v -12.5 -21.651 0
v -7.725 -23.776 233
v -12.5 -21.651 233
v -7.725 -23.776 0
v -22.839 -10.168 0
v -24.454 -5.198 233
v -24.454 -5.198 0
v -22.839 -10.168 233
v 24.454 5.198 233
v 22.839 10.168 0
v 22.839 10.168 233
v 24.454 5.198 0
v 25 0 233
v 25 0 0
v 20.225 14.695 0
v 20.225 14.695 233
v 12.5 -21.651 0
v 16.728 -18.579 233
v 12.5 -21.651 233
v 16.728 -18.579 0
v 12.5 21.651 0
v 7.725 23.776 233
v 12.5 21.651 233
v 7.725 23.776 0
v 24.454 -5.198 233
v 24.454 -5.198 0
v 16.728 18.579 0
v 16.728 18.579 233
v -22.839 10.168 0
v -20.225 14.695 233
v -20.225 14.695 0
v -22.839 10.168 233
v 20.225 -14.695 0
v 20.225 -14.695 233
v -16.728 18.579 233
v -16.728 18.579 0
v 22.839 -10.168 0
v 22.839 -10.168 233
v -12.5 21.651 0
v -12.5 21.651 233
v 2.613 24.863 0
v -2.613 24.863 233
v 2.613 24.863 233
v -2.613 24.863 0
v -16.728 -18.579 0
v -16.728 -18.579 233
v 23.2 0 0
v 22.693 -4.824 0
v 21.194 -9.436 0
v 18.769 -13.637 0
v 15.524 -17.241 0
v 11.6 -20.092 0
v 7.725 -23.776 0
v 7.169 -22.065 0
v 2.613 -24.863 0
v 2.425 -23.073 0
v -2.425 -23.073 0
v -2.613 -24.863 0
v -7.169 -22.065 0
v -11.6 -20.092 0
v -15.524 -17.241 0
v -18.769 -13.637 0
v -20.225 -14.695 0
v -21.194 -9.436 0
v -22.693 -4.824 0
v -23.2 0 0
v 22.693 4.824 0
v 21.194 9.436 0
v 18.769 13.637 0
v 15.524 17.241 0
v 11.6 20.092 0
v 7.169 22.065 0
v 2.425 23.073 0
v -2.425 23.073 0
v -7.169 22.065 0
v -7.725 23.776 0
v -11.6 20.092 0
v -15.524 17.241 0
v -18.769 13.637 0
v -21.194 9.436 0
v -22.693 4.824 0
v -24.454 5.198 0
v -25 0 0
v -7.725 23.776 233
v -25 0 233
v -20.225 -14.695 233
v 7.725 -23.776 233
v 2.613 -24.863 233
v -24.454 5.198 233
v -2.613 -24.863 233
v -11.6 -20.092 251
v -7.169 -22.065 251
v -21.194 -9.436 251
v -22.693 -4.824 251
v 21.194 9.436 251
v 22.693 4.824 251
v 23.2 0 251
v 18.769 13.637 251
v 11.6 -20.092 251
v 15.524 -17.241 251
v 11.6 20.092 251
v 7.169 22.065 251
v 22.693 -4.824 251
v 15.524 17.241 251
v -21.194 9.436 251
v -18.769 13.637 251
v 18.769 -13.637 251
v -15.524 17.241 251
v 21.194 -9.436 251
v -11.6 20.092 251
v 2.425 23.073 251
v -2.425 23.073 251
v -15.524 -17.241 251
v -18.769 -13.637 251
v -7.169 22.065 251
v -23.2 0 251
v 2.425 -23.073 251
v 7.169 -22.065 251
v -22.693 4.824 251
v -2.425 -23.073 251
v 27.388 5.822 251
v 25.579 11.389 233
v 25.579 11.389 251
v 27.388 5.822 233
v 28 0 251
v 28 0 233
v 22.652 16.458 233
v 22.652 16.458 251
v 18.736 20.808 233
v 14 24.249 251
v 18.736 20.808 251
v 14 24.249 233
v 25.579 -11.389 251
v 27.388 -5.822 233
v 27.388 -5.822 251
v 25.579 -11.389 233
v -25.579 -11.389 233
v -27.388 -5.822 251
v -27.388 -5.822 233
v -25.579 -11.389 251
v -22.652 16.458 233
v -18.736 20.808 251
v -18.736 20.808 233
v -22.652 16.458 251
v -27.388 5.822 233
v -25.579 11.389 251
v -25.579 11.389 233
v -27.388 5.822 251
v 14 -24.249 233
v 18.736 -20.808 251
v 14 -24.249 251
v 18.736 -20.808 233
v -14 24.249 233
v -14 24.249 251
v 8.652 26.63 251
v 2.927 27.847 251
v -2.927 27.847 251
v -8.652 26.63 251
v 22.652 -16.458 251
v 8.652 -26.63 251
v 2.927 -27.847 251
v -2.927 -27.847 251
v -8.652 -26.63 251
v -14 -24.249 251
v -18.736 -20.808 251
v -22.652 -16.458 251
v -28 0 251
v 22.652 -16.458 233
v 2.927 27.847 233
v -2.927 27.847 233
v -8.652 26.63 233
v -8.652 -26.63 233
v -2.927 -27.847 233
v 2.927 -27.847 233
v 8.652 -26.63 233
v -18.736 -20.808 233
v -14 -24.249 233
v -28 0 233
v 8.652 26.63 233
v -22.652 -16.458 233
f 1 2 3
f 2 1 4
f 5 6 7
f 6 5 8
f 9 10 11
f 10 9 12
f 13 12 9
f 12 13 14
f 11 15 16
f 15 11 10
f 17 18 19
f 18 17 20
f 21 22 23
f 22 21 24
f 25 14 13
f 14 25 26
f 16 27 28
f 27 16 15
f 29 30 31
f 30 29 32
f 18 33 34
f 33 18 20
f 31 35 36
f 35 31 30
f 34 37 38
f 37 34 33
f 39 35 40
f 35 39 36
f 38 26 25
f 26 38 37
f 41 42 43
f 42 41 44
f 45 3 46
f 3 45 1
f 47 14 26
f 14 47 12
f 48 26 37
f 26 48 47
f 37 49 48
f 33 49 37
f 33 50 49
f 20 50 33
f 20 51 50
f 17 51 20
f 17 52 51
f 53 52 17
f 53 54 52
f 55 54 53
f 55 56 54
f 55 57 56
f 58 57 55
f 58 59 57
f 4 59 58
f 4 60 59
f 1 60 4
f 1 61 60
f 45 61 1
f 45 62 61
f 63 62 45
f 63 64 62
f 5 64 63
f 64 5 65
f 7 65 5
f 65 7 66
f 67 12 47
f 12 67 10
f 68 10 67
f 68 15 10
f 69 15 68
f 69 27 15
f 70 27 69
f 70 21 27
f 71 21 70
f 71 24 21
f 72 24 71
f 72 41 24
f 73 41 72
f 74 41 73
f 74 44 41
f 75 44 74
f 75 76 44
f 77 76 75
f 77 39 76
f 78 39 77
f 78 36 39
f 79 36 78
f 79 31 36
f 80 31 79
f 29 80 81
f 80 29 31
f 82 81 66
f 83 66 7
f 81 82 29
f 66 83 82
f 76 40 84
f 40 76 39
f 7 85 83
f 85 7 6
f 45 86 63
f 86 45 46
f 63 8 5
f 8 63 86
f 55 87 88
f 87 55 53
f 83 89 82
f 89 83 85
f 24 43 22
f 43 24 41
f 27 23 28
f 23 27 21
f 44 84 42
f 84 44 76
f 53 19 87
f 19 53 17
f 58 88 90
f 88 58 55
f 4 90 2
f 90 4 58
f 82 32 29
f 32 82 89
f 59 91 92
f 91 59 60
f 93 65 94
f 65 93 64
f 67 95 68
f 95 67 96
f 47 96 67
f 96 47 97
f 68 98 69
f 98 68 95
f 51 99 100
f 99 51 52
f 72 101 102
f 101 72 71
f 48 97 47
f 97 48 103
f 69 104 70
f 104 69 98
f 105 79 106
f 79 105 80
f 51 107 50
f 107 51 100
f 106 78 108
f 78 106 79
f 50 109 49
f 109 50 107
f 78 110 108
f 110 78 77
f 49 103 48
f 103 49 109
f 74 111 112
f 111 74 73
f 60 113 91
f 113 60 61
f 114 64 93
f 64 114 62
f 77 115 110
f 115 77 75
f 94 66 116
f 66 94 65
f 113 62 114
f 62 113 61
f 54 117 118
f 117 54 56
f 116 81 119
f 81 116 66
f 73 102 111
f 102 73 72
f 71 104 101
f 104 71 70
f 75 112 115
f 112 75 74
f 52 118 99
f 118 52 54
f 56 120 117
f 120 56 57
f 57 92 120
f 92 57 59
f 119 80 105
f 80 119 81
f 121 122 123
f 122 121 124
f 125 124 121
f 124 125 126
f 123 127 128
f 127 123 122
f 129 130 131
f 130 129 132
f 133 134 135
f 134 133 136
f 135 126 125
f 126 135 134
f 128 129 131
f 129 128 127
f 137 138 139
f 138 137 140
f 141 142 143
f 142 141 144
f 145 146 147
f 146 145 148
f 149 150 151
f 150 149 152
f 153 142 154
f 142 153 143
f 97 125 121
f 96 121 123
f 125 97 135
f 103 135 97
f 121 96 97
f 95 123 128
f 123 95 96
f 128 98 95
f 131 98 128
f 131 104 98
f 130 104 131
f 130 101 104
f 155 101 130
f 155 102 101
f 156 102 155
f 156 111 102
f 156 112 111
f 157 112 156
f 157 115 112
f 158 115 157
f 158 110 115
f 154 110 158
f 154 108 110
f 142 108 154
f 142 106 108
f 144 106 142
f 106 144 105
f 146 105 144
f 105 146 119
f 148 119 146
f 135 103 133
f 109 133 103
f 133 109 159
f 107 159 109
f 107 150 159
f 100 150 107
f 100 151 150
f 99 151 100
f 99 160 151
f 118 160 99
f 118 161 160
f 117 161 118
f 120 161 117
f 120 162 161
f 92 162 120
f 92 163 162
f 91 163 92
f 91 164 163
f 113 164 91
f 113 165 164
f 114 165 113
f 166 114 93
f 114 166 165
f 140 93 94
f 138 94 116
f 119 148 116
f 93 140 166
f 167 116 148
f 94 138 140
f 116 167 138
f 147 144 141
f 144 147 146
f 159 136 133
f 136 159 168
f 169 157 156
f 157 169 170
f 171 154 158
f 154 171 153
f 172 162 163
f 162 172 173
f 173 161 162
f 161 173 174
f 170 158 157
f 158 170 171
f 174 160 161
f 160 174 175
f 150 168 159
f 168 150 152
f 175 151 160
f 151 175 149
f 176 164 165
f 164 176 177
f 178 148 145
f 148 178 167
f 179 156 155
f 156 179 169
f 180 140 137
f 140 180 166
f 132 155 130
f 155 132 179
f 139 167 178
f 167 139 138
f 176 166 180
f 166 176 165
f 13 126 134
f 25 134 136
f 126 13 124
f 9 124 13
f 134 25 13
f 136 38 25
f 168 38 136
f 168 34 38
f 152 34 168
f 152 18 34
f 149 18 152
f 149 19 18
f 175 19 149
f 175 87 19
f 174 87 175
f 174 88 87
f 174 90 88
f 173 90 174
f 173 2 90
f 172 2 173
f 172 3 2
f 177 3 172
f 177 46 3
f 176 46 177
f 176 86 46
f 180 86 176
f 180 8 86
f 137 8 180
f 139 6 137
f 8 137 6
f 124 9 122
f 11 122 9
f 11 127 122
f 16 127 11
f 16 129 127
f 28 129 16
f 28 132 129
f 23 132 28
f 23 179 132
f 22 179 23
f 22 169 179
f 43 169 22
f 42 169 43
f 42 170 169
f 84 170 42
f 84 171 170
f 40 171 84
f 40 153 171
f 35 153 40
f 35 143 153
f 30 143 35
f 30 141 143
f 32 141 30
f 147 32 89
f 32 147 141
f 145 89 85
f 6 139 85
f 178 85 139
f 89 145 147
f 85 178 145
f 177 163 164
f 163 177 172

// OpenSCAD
// Parameters
length_mm = 250; //[125:500:1]
ht50_outer_diameter = 50; //[45:60:0.5]
wall_thickness = 1.8; //[1:3.6:0.1]
include_end_fitting = 1; //[0:1:1]
fitting_length = 18; //[9:36:1]
fitting_od_increase = 6; //[3:12:0.5]
overlap = 1; //[0.5:2:0.1]

// HT Pipe Segment - complete geometry
module ht_pipe() {
  color([0.85, 0.85, 0.8]) { // PVC color
    // Main pipe segment
    difference() {
      cylinder(h=length_mm, r=ht50_outer_diameter/2, center=false);
      translate([0, 0, 0])
        cylinder(h=length_mm, r=ht50_outer_diameter/2 - wall_thickness, center=false);
    }
    
    // End fitting geometry
    if (include_end_fitting) {
      translate([0, 0, length_mm - fitting_length + overlap])
        difference() {
          cylinder(h=fitting_length, r=ht50_outer_diameter/2 + fitting_od_increase/2, center=false);
          translate([0, 0, 0])
            cylinder(h=fitting_length, r=ht50_outer_diameter/2 - wall_thickness, center=false);
        }
    }
  }
}

// Assembly
module assembly() {
  ht_pipe();
}

assembly();
